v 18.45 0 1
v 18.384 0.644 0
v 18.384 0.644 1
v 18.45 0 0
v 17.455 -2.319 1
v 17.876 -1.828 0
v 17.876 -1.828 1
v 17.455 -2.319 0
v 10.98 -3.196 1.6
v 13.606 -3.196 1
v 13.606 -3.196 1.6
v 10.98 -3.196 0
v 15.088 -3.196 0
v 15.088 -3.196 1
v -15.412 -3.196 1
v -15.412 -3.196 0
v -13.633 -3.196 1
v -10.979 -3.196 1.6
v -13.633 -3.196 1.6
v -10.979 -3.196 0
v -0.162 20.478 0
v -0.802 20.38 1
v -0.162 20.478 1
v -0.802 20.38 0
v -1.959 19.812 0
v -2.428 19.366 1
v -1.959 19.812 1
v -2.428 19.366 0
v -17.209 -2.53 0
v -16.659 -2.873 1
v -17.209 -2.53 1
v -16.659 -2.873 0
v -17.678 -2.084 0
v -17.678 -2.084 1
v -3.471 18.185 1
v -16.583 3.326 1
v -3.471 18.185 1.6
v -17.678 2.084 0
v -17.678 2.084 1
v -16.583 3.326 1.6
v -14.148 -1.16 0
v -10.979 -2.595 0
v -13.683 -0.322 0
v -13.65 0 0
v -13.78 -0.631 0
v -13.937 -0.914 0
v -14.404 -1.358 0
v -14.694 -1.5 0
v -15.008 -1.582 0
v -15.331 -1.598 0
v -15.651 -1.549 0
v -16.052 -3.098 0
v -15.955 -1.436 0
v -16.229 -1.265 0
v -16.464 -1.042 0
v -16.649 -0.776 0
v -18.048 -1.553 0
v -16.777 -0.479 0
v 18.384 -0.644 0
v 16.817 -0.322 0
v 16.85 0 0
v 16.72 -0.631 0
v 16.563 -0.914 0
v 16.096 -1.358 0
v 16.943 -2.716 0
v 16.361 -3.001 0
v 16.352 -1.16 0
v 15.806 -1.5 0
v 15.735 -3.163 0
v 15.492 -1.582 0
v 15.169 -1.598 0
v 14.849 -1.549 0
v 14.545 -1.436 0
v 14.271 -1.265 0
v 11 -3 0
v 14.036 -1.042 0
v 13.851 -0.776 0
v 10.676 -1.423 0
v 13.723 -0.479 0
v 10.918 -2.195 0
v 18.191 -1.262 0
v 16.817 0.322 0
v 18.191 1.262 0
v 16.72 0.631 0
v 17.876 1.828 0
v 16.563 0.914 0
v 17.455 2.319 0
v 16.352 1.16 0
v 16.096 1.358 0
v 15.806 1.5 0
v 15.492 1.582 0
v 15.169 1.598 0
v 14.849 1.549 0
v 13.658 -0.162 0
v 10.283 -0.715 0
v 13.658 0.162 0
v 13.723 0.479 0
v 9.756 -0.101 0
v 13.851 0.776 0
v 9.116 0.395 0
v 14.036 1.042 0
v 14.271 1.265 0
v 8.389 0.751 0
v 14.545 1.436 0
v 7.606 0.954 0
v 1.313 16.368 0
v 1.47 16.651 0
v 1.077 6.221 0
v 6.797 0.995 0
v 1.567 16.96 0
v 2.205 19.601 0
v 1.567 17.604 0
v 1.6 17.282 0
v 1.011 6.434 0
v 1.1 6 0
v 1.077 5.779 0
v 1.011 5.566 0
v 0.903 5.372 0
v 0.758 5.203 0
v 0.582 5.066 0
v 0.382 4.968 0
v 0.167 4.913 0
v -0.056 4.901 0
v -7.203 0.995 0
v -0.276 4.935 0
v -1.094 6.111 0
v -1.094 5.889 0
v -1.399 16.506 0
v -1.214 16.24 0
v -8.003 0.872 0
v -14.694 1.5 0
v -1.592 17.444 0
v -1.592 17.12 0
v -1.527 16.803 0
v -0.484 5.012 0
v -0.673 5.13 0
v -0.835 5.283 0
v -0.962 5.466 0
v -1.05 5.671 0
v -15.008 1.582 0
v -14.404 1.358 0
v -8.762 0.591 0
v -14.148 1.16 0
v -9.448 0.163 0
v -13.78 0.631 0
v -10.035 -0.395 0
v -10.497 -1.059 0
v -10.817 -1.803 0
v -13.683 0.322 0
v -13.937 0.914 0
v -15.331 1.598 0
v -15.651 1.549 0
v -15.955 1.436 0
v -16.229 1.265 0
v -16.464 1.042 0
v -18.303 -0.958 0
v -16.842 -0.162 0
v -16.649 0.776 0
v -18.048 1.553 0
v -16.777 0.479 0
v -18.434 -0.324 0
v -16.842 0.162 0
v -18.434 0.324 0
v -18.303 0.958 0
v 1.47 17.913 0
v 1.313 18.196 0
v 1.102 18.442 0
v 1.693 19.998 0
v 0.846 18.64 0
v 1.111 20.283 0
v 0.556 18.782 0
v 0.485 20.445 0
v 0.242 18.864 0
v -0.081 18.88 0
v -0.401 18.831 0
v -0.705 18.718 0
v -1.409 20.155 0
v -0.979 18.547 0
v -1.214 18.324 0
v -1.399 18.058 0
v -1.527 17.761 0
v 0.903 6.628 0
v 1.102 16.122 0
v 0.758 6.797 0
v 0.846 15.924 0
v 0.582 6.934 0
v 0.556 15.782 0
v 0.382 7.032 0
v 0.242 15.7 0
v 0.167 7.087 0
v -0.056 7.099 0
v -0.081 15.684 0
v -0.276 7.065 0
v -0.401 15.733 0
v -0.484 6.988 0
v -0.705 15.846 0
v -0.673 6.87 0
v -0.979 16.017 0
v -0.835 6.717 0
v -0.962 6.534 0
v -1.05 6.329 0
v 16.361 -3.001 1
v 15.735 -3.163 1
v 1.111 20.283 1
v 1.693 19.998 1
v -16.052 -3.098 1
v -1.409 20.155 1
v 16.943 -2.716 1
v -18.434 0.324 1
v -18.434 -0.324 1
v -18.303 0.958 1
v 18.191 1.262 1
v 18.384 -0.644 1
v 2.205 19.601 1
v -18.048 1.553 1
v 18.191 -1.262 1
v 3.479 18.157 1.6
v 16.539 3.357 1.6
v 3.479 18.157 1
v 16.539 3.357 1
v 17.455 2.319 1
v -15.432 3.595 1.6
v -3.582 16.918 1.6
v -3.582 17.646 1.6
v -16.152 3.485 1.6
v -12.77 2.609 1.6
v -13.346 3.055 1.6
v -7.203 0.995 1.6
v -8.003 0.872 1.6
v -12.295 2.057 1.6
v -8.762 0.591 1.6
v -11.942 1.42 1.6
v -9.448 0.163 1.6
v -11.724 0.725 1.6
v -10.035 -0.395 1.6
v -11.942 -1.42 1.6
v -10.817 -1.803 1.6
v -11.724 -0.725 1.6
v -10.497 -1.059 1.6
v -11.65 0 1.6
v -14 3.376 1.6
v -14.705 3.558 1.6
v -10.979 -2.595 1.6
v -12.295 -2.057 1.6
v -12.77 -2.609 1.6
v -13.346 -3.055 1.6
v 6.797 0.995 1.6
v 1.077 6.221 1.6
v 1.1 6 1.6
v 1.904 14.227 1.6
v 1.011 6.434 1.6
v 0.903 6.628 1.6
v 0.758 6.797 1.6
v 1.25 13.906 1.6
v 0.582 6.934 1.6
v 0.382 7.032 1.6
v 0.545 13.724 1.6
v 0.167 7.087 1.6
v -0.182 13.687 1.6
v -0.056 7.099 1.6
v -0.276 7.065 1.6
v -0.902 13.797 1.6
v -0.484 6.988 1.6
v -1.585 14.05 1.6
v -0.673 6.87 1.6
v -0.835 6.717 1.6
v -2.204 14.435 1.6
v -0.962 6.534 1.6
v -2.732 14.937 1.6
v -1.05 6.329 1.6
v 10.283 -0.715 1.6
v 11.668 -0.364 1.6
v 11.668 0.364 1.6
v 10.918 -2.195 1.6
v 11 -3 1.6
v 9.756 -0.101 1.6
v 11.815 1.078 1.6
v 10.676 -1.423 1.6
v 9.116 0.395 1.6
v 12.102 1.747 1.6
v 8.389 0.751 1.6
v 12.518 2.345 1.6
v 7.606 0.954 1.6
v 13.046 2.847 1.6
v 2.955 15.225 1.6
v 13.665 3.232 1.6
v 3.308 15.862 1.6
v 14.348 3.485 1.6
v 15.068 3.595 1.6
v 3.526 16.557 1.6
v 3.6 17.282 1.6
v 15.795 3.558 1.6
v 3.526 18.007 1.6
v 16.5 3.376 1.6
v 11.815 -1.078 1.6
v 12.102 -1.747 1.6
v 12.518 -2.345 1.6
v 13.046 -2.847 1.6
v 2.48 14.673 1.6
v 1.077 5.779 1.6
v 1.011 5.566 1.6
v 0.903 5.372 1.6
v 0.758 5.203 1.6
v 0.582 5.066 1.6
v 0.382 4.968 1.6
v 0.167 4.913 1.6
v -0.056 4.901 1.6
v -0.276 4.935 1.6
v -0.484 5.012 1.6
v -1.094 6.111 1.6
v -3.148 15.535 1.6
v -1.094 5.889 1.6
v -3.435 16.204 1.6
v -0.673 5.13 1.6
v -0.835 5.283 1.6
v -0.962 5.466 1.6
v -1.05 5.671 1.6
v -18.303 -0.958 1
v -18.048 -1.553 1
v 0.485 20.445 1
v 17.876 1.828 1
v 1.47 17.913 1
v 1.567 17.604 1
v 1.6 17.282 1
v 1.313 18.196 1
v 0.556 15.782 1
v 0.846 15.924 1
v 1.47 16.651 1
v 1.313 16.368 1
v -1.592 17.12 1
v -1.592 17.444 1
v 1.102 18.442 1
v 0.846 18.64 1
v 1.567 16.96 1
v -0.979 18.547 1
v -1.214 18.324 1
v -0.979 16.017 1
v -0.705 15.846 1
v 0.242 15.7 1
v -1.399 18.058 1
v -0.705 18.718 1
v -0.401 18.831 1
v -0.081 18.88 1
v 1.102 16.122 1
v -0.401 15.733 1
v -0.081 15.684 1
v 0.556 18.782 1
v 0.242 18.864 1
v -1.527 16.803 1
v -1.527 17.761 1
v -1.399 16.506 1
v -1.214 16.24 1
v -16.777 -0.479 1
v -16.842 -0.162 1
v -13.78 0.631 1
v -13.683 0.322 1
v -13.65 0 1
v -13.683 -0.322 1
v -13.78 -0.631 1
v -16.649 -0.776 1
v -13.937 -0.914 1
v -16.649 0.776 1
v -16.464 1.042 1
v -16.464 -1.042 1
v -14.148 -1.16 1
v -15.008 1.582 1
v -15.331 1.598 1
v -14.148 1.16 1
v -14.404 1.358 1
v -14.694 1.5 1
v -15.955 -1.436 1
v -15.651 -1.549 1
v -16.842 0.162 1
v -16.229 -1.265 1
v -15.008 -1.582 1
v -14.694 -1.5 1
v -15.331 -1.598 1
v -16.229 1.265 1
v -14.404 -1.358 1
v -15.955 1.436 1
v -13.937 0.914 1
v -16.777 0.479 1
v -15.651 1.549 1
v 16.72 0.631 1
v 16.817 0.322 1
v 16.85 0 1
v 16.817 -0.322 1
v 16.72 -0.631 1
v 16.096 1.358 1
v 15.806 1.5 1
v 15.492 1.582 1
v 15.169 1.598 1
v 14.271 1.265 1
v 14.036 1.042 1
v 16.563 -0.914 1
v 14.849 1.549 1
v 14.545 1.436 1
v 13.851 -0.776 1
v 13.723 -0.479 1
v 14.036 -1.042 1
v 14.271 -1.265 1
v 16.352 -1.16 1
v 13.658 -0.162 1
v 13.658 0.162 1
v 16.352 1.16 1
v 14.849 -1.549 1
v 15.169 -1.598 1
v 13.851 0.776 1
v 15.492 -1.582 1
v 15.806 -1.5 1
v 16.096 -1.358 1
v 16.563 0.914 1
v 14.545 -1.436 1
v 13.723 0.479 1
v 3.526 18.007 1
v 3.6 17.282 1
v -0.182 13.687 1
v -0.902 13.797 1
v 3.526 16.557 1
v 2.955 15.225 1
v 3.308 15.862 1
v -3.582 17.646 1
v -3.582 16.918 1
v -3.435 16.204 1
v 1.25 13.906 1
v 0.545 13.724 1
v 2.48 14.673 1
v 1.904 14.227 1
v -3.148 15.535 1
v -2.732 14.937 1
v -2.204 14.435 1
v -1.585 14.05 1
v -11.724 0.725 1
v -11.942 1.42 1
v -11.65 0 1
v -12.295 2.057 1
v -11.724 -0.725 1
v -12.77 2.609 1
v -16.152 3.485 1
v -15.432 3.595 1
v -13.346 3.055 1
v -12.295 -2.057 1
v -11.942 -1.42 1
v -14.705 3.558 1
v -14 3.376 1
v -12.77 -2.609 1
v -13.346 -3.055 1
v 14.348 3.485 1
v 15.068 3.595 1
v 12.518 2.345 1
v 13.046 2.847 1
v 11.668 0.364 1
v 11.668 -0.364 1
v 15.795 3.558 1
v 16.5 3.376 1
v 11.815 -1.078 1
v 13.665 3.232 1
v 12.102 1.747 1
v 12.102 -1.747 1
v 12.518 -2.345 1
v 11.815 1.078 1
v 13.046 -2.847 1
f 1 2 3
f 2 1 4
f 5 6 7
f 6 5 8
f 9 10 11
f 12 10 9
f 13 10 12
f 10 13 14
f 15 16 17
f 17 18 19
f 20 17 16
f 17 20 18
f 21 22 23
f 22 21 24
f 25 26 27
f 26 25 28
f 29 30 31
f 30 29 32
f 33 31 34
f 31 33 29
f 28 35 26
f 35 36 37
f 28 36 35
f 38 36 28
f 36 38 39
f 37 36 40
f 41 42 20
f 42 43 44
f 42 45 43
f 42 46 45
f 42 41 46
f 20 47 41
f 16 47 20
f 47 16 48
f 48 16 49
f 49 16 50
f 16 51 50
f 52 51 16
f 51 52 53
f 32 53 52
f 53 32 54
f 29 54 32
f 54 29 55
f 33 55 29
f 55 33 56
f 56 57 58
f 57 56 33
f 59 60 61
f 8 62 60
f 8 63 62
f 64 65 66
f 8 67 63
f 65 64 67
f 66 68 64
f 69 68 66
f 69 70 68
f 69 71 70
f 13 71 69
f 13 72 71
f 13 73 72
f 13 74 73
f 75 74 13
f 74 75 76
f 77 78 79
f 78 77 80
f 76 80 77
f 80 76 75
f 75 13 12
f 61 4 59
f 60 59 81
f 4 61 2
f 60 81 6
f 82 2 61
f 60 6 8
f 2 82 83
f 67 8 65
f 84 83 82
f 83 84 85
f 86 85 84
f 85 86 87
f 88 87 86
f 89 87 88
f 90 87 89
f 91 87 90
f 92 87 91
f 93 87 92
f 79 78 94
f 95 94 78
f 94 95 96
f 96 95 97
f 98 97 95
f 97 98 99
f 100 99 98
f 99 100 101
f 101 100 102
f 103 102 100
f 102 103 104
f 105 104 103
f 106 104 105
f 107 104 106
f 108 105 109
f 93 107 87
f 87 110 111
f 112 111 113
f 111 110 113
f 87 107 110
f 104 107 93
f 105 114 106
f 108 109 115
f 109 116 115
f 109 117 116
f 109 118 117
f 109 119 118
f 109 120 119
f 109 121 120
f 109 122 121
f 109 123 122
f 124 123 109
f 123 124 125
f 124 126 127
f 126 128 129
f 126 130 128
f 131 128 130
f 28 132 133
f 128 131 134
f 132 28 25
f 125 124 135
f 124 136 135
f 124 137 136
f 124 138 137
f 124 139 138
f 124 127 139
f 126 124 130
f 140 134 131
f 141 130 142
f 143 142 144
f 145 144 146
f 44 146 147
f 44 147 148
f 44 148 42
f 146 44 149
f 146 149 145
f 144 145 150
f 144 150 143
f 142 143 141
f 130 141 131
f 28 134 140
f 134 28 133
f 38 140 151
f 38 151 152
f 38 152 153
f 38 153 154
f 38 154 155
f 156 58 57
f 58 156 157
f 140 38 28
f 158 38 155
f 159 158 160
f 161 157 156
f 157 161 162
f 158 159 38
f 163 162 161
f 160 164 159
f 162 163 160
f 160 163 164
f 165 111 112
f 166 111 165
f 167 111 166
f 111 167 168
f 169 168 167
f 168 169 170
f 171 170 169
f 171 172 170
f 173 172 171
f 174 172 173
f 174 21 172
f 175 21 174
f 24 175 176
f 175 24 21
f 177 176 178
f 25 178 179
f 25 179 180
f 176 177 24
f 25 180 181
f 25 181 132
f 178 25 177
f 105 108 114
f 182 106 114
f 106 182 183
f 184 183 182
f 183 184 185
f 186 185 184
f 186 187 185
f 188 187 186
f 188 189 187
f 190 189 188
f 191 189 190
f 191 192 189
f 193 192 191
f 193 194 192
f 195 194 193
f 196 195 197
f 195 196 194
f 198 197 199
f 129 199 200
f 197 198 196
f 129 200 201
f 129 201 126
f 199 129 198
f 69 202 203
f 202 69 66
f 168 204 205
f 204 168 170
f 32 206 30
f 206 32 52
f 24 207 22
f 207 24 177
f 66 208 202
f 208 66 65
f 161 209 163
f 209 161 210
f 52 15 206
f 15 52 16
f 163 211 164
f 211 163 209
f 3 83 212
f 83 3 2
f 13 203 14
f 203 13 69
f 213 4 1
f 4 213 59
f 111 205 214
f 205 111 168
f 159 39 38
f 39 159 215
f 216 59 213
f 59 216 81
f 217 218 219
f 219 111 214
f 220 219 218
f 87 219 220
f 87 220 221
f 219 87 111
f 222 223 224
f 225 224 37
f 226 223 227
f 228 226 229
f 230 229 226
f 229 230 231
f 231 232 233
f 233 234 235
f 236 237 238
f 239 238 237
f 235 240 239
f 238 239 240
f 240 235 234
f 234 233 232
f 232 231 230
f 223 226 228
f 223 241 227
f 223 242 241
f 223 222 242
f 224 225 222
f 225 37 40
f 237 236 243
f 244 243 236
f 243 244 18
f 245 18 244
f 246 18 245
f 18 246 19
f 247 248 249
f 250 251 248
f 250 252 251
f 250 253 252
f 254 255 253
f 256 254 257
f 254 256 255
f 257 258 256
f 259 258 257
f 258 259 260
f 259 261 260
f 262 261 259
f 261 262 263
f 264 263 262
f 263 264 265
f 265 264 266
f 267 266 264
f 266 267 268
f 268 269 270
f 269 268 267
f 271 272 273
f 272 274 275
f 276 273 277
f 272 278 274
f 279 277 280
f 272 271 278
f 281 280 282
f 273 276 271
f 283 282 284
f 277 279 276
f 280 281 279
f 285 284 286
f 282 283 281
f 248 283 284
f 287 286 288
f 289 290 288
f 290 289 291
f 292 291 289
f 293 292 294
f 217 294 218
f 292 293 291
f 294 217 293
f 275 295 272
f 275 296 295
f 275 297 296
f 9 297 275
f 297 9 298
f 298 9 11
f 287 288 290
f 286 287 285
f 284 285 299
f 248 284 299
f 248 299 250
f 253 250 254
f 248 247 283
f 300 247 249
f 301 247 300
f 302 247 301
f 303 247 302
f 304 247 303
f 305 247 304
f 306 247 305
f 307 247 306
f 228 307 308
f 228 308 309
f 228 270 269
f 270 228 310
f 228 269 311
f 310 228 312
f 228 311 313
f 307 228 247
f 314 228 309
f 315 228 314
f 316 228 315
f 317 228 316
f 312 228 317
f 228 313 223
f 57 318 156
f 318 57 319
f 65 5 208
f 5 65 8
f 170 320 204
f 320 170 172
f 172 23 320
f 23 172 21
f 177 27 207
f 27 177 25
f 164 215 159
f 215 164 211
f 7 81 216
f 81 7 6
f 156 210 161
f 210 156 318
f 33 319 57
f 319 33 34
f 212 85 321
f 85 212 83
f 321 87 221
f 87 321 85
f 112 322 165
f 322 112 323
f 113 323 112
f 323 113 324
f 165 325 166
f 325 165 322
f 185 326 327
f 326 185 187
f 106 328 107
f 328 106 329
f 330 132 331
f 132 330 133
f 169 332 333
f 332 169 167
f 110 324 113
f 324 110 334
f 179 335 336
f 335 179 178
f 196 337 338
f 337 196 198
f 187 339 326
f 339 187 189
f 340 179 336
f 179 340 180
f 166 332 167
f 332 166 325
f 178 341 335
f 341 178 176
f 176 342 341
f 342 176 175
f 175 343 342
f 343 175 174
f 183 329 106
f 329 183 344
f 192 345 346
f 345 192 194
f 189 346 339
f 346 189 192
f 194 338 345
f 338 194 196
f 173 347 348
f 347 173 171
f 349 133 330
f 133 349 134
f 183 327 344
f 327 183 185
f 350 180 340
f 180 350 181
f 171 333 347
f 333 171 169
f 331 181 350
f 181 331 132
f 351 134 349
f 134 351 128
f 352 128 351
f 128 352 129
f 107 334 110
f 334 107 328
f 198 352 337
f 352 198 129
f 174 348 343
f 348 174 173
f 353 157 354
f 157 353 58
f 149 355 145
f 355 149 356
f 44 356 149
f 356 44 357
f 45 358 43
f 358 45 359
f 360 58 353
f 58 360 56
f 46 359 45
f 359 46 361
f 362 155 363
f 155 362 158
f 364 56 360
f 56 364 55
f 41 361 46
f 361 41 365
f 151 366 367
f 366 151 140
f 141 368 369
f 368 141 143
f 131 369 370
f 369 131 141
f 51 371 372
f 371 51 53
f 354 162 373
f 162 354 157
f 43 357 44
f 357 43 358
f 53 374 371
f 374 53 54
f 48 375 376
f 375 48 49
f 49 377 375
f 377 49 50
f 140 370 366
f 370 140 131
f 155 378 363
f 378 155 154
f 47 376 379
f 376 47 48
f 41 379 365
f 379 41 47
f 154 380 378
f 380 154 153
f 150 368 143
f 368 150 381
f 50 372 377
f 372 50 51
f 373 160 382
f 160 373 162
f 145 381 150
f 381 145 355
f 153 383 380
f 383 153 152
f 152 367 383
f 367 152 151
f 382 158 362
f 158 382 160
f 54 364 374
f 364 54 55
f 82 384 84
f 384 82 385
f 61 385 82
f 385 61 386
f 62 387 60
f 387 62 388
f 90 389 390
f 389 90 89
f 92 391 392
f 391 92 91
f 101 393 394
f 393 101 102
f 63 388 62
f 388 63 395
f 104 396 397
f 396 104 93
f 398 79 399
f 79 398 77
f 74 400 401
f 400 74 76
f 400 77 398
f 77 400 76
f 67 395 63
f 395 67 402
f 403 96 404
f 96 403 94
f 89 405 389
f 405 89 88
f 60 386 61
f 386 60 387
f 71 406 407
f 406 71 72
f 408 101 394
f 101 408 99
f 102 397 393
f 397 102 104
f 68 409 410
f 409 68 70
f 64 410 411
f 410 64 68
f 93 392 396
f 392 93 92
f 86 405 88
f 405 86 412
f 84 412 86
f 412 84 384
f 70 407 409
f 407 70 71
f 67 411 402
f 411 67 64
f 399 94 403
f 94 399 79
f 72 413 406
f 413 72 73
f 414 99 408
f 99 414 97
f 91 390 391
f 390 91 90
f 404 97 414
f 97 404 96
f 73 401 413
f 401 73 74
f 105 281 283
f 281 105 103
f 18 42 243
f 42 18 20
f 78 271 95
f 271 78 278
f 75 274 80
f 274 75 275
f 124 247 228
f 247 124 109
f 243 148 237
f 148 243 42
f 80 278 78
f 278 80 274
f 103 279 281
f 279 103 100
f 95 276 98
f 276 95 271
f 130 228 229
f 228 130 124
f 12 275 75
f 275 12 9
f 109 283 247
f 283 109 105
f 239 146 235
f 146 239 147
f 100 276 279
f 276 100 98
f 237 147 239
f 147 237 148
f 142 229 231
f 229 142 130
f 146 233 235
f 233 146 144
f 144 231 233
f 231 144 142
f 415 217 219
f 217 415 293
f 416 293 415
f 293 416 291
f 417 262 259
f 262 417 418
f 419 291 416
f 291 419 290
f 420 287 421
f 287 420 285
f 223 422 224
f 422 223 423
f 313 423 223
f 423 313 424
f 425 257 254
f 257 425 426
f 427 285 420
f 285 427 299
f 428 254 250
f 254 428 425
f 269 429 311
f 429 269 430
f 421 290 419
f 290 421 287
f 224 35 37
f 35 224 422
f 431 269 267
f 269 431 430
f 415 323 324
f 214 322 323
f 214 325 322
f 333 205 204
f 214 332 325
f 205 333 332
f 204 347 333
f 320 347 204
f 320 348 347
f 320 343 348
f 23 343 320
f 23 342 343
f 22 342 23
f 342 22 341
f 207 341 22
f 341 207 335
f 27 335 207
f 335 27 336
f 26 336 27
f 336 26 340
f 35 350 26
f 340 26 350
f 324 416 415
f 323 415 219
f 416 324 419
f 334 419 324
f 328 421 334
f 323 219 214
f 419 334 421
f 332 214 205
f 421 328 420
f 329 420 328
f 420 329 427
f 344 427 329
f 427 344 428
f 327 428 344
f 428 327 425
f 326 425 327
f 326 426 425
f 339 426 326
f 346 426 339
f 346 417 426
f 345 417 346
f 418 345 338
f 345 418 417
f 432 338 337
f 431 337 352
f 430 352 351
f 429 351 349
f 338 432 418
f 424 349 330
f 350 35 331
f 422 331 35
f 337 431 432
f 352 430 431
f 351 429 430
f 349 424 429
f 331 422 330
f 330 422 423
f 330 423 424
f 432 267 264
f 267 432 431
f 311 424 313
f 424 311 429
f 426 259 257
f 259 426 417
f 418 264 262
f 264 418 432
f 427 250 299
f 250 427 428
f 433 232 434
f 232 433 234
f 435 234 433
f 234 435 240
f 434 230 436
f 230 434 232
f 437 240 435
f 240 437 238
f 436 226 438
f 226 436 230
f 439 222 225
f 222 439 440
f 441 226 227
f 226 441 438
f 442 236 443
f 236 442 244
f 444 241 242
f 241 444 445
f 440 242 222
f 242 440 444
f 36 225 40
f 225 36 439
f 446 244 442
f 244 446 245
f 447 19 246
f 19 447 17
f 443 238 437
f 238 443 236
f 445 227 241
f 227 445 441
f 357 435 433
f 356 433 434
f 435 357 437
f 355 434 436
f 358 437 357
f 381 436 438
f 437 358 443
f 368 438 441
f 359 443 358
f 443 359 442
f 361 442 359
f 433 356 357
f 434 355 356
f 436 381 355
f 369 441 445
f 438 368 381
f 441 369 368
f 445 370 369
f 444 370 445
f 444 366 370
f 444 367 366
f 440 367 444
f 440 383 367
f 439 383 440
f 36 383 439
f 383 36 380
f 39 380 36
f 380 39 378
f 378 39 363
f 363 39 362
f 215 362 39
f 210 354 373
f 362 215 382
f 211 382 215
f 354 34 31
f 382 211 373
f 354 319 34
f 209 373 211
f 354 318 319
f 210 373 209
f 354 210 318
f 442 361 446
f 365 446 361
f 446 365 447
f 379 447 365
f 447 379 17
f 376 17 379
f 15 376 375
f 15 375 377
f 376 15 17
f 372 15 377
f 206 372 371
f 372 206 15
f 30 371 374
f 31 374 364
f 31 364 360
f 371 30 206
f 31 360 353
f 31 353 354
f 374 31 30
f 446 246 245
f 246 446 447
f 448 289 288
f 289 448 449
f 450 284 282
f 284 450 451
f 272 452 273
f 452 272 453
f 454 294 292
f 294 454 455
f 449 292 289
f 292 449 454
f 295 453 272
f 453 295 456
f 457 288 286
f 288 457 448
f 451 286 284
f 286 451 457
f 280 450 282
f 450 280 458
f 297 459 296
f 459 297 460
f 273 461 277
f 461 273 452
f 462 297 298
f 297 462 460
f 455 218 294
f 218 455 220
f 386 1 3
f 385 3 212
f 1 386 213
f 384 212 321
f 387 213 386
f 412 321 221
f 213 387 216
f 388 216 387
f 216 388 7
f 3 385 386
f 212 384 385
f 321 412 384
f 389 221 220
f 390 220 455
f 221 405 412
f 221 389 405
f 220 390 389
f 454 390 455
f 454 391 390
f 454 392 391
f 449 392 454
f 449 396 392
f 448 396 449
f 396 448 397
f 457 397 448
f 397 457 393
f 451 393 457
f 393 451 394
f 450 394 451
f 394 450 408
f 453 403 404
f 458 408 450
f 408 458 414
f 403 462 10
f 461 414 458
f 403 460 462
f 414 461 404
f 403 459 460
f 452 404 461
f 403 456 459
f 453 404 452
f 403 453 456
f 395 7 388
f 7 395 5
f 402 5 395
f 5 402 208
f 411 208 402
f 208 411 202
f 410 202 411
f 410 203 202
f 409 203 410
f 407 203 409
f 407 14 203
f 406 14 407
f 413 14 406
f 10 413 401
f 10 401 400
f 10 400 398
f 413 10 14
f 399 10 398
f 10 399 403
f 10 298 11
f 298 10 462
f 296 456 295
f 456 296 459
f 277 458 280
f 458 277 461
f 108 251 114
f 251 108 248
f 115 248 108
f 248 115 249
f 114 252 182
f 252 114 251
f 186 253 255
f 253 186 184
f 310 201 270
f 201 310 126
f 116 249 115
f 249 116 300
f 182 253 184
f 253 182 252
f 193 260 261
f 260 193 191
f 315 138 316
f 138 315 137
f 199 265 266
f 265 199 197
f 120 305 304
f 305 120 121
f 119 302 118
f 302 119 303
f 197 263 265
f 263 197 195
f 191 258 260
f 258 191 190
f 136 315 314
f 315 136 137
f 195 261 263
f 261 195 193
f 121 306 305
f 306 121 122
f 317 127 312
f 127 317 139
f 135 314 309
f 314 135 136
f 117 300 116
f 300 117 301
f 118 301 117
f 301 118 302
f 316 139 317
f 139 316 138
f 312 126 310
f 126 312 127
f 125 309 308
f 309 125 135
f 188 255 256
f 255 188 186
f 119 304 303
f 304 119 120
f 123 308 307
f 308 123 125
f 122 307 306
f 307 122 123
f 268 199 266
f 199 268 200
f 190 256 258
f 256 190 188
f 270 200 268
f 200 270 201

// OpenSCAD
$fn = 31;
hole = 3.2;
pad = 1.6;
th = 1.6;
md = 30.5;
m1 = 32.532 - md / 2;
pad_th = 1;

difference(){
    hull(){
        translate([0, m1, 0])cylinder(d=hole + pad * 2, h=th);
        translate([-md/2, 0, 0])cylinder(d=hole + pad * 2, h=th);
        translate([md/2, 0, 0])cylinder(d=hole + pad * 2, h=th);
        }
    translate([0, m1, 0])cylinder(d=hole, h=th*3, center=true);
    translate([-md/2, 0, 0])cylinder(d=hole, h=th*3, center=true);
    translate([md/2, 0, 0])cylinder(d=hole, h=th*3, center=true);
    hull(){
        l1=7;
        l2=3;
        d=8;
        translate([-l1, -l2, 0])cylinder(d=d, h=10, center=true);
        translate([l1, -l2, 0])cylinder(d=d, h=10, center=true);   
        }
    translate([0, m1, pad_th])cylinder(d=hole + pad * 2.5, h=th);
    translate([-md/2, 0, pad_th])cylinder(d=hole + pad * 2.5, h=th);
    translate([md/2, 0, pad_th])cylinder(d=hole + pad * 2.5, h=th);
    translate([0, 6, 0])cylinder(d=2.2, h=10, center=true);
}
